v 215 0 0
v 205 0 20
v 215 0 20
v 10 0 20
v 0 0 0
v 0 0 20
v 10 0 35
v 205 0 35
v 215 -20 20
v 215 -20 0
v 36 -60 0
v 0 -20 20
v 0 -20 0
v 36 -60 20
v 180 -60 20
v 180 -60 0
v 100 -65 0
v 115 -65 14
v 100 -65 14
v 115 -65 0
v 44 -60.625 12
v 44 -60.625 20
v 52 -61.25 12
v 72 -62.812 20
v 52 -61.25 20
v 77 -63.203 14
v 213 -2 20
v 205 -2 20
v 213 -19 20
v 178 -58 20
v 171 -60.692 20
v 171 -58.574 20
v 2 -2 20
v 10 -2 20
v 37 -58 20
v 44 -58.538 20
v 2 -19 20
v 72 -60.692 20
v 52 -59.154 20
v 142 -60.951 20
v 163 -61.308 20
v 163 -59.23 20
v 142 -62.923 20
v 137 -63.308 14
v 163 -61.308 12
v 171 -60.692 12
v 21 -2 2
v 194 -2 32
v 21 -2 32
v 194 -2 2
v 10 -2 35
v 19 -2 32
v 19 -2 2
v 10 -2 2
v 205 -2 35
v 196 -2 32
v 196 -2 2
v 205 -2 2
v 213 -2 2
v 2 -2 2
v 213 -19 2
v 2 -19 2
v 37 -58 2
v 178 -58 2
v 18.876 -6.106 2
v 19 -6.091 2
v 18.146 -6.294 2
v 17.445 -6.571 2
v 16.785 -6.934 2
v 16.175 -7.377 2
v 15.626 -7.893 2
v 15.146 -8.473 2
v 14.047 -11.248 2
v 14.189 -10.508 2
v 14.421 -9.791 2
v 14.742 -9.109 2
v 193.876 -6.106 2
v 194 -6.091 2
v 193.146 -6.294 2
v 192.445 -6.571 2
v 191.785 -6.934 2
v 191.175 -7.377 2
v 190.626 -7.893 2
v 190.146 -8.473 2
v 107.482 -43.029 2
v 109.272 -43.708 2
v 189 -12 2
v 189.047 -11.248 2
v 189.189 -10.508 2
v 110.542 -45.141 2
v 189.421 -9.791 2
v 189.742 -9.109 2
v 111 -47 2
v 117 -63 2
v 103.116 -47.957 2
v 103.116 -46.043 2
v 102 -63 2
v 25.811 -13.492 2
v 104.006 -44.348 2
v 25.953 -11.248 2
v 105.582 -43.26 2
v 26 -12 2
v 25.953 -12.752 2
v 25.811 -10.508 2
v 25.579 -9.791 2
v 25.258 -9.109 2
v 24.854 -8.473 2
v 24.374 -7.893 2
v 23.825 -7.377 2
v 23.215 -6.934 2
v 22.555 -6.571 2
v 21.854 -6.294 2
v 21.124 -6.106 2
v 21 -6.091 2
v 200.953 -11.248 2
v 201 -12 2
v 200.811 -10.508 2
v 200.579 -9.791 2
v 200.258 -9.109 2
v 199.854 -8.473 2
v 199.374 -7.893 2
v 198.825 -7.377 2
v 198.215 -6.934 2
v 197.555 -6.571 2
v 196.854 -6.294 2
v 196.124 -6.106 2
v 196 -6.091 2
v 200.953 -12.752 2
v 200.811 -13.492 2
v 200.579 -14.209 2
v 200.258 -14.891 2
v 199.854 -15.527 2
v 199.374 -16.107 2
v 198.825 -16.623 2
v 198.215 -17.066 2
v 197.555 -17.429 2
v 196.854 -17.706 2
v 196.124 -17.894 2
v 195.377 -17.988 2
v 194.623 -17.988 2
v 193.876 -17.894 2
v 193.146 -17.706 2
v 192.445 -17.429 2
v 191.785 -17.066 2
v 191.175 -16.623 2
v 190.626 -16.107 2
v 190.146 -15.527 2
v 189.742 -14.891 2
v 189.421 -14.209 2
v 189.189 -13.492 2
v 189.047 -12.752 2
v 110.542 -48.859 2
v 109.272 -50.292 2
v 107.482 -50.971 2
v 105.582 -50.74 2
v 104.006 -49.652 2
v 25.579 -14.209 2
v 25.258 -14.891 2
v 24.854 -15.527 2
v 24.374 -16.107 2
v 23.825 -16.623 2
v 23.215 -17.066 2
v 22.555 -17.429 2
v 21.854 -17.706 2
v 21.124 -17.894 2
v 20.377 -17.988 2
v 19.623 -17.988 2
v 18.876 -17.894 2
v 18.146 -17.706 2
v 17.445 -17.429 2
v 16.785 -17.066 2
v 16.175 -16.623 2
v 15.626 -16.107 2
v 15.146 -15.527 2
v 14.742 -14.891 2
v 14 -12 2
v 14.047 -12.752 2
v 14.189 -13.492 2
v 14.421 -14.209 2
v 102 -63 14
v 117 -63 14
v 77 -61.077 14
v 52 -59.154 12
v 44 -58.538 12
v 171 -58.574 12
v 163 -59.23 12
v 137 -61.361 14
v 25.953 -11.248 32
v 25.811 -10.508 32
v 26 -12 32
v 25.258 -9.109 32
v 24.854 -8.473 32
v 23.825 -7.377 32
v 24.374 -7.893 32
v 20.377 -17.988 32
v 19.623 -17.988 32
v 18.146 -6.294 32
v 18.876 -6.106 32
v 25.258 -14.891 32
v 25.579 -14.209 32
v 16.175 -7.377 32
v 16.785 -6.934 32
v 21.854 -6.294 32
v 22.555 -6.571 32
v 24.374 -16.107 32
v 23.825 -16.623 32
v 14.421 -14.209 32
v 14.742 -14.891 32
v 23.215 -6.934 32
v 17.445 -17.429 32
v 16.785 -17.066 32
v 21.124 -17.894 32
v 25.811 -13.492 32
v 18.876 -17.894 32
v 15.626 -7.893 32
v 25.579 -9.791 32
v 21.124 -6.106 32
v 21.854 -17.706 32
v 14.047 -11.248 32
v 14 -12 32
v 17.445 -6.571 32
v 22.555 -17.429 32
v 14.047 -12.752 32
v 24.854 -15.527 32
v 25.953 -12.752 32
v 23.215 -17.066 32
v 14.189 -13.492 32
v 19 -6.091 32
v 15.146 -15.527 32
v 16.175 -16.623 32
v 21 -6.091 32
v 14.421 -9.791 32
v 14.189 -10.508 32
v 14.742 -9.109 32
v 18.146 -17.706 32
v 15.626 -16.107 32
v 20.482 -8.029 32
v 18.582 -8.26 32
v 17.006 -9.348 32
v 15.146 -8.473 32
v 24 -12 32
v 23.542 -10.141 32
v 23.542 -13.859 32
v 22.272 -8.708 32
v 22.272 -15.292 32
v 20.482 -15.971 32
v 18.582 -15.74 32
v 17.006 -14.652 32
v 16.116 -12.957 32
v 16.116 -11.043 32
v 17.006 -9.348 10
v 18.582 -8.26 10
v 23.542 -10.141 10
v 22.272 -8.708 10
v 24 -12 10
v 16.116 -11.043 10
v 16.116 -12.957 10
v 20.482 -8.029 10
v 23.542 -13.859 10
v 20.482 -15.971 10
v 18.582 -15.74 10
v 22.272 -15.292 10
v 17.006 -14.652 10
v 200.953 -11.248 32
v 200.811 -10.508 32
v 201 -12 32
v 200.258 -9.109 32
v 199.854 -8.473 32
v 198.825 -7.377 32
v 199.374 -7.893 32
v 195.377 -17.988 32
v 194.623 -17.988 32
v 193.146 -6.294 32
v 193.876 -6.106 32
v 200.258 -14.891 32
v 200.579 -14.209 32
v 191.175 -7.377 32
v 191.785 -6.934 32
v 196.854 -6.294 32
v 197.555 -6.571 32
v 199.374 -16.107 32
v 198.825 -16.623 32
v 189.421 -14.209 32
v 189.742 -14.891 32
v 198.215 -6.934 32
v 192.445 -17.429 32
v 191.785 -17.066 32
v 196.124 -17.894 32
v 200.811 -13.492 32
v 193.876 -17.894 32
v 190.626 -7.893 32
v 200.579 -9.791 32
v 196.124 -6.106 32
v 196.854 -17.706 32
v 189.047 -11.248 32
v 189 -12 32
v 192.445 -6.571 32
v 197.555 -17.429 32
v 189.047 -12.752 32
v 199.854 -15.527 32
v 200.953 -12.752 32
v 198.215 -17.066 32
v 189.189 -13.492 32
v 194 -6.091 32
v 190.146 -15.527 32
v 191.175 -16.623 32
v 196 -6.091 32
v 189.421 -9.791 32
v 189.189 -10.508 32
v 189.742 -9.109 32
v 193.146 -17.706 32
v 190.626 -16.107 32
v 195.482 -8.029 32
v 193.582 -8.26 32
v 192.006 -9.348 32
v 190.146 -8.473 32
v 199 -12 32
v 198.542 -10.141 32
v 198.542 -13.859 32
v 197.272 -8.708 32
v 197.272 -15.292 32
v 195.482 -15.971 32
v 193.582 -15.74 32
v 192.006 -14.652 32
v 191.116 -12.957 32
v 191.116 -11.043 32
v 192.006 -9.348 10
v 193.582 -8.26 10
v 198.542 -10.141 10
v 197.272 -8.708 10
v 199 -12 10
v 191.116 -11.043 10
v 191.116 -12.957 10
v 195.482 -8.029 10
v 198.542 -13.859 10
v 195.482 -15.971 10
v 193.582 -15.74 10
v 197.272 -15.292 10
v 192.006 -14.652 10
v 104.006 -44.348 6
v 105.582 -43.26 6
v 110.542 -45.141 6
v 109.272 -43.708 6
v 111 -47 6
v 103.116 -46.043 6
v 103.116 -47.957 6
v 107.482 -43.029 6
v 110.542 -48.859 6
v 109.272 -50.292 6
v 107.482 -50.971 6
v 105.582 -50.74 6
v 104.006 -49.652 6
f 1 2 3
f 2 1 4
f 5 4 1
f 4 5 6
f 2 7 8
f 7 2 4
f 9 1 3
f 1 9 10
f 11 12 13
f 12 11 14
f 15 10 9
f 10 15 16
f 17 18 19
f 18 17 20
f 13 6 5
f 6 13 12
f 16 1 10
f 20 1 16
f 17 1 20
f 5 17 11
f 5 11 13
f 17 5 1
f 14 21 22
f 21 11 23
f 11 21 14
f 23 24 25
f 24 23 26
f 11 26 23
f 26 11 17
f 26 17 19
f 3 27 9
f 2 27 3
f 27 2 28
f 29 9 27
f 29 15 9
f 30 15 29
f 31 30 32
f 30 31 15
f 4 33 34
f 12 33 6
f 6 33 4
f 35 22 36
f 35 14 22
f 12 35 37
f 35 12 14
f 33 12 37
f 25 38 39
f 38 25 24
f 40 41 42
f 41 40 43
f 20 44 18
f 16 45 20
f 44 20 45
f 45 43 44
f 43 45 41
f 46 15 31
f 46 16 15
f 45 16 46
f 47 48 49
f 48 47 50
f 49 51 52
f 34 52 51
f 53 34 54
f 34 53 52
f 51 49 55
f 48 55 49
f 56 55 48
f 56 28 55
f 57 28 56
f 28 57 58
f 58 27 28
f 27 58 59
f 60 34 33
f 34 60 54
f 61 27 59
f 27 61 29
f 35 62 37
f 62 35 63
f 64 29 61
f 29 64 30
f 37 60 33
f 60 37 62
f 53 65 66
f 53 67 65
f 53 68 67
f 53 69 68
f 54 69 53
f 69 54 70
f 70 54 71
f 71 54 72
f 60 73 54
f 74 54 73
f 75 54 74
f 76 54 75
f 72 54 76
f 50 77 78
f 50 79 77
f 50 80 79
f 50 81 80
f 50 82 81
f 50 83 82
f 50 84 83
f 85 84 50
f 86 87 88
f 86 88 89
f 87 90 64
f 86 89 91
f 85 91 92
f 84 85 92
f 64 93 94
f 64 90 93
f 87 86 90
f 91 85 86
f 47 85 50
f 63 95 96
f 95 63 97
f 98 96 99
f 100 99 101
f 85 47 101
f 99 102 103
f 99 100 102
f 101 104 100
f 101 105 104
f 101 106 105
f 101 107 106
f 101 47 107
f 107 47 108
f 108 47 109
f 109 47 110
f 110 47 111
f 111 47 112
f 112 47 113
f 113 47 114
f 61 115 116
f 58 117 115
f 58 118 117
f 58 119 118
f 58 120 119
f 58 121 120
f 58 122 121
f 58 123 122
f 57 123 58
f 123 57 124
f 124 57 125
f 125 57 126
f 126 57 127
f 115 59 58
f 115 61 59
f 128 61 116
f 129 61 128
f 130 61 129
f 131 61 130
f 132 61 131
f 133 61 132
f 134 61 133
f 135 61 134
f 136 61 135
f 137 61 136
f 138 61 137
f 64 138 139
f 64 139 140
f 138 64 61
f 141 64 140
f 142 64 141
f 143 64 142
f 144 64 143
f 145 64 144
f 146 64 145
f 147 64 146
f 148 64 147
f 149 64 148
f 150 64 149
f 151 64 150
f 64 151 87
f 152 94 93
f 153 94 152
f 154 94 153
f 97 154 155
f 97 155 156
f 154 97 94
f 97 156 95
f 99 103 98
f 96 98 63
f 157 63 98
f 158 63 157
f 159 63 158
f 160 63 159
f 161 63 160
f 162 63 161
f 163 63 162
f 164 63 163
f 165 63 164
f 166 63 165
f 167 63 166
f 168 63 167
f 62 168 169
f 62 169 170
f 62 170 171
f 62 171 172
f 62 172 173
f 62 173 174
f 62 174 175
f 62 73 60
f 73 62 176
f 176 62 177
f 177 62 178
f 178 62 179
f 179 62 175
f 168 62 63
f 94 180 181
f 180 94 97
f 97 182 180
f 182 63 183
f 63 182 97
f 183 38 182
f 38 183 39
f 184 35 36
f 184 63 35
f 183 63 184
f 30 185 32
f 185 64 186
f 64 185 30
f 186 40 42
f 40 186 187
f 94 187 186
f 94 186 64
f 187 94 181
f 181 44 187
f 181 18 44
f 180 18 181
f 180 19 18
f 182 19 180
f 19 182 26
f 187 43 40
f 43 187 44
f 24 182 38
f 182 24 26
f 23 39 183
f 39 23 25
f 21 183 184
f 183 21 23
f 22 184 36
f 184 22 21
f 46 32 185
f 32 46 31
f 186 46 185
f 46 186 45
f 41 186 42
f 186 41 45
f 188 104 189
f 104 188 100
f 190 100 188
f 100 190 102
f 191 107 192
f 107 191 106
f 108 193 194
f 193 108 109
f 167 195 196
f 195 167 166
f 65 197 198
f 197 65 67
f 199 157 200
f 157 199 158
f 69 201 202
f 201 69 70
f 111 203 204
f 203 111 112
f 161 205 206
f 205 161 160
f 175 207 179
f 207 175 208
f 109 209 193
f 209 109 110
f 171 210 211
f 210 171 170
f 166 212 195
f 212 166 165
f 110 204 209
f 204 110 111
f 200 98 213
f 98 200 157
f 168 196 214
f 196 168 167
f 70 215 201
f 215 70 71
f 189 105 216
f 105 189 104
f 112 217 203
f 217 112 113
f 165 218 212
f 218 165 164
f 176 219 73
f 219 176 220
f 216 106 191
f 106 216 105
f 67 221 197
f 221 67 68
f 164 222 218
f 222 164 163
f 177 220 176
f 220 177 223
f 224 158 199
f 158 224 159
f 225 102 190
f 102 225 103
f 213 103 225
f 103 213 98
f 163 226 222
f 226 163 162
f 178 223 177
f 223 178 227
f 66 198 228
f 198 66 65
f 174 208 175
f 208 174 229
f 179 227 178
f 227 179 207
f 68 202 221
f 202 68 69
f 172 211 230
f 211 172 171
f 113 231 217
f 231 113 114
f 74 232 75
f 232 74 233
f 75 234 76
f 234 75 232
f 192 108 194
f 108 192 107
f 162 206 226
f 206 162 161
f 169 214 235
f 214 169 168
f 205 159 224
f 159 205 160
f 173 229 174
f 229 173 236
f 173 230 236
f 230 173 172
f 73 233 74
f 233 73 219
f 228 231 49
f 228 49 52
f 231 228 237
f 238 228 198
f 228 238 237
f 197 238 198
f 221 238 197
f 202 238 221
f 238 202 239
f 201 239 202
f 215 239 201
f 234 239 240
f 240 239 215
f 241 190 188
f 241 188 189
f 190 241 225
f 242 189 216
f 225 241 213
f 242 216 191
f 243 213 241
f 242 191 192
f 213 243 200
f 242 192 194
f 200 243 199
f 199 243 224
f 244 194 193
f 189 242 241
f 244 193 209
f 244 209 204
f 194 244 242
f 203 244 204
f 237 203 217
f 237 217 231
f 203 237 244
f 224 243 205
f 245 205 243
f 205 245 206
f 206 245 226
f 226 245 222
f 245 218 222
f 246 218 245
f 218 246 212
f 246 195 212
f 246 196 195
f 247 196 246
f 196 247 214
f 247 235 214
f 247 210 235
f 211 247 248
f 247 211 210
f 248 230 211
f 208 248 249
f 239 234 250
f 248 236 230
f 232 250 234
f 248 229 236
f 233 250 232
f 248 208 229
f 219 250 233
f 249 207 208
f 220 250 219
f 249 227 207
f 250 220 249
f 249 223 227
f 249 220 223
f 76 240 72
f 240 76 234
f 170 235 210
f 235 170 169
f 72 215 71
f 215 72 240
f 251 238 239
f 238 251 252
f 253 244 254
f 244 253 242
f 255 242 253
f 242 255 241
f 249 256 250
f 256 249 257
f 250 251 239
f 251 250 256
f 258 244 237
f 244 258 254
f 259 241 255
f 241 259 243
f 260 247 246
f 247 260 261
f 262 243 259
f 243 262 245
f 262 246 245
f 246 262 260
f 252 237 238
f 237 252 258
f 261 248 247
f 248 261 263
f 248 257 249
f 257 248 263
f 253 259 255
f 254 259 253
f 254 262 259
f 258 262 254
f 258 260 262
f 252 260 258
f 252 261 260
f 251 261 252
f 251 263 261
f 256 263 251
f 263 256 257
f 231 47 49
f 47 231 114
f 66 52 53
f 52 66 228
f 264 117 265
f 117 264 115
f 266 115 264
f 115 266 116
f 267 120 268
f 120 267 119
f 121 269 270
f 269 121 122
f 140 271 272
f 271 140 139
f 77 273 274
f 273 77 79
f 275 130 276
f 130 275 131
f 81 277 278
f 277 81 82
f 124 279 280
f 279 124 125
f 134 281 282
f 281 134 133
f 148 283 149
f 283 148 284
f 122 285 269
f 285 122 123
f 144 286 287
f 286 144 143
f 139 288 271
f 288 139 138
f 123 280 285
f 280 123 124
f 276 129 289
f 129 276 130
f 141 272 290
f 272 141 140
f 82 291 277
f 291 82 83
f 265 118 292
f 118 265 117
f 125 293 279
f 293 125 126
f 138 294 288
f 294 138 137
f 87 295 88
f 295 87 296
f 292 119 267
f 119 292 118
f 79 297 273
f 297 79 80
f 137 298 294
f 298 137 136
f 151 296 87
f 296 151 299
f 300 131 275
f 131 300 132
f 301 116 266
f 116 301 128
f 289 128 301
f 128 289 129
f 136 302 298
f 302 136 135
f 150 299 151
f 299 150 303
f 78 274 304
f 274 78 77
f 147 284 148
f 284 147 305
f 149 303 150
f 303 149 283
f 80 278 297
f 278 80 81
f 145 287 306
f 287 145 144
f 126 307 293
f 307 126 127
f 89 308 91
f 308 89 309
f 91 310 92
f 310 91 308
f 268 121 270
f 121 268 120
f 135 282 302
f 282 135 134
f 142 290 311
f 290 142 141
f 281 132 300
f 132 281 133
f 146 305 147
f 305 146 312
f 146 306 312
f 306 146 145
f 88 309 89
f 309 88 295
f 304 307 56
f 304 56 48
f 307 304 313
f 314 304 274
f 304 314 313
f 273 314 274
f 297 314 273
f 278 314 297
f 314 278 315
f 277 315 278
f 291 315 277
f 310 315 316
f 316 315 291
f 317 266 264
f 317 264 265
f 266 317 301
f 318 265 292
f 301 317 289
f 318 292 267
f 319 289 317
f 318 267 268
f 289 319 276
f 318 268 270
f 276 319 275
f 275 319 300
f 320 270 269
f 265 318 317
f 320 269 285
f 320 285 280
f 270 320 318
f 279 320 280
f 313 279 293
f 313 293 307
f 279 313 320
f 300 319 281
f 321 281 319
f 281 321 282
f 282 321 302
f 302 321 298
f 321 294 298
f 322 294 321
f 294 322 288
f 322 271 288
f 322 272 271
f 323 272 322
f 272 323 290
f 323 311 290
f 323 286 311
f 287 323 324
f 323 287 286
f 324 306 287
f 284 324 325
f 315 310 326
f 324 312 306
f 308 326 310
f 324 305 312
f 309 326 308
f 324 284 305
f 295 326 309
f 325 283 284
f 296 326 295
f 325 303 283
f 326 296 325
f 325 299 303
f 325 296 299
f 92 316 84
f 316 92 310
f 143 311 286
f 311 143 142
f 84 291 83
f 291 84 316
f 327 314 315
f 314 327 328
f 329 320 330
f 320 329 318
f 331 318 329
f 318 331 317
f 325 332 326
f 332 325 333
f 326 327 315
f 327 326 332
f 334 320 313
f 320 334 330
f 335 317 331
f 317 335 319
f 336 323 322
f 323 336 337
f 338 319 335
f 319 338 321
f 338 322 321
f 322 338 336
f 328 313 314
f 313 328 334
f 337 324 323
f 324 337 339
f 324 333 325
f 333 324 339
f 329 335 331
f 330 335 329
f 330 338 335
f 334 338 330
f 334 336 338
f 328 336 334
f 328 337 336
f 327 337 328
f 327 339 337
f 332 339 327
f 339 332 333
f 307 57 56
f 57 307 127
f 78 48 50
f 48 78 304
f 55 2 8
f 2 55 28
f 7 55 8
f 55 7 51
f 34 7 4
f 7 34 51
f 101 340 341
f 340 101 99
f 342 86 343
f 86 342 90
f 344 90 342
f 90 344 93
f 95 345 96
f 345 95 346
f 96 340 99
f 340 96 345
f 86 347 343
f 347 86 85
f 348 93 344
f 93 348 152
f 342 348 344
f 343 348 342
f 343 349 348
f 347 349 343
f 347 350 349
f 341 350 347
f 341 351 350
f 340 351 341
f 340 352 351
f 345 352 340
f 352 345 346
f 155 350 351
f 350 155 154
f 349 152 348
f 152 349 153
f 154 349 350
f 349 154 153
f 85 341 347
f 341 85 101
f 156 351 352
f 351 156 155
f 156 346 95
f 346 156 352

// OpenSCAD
module outside() {
    polygon(
        points=[ 
            [0, 0], 
            [215, 0], 
            [215, -20], 
            [180, -60], 
            [115, -65],
            [100, -65],
            [36, -60], 
            [0, -20]         
        ]
    );
};

module inside() {
    polygon(
        points=[ 
            [0, 0], 
            [211, 0], 
            [211, -17], 
            [176, -56], 
            [115, -61],
            [100, -61],
            [35, -56], 
            [0, -17]         
        ]
    );
};

module topshield() {
    cube([195, 2, 35]);
}

module holdertube() {
    union() {
        difference(){
            cylinder(32, d=12, $fn=50);
            translate([0, 0, 10])
                cylinder(22, d=8);
        }
        translate([-1, 5, 0])
            cube([2,6,32]);
    };
};

module holder() {
    cylinder(6, d=8);
}

module outcut1() {
    rotate([90, 0, 0])
    linear_extrude(height=10)
    polygon(
        points=[ 
            [-35, 0],
            [35, 0],
            [30, -6],
            [-30, -6],
        ]
    );
};

module outcut2() {
    cube(8);
}
    
module all() {
    union() {
        difference(){
            linear_extrude(height=20)
                outside();
            
            translate([2,-2,2])
                linear_extrude(height=18)
                    inside();
            
            translate([107,-55, 20])
                outcut1();
            
            translate([44,-63, 12])
                outcut2();
            
            translate([163,-63, 12])
                outcut2();
           
        };
        
        translate([10,-2,0])
            topshield();
        
        translate([20, -12, 0])
            holdertube(); 
        
        translate([195, -12, 0])
            holdertube(); 
        
        translate([107, -47, 0])
            holder();
    };
};

// projection is for creating a dxf file to measure the object
//projection(cut=true) translate([0,0, -15])
all();
